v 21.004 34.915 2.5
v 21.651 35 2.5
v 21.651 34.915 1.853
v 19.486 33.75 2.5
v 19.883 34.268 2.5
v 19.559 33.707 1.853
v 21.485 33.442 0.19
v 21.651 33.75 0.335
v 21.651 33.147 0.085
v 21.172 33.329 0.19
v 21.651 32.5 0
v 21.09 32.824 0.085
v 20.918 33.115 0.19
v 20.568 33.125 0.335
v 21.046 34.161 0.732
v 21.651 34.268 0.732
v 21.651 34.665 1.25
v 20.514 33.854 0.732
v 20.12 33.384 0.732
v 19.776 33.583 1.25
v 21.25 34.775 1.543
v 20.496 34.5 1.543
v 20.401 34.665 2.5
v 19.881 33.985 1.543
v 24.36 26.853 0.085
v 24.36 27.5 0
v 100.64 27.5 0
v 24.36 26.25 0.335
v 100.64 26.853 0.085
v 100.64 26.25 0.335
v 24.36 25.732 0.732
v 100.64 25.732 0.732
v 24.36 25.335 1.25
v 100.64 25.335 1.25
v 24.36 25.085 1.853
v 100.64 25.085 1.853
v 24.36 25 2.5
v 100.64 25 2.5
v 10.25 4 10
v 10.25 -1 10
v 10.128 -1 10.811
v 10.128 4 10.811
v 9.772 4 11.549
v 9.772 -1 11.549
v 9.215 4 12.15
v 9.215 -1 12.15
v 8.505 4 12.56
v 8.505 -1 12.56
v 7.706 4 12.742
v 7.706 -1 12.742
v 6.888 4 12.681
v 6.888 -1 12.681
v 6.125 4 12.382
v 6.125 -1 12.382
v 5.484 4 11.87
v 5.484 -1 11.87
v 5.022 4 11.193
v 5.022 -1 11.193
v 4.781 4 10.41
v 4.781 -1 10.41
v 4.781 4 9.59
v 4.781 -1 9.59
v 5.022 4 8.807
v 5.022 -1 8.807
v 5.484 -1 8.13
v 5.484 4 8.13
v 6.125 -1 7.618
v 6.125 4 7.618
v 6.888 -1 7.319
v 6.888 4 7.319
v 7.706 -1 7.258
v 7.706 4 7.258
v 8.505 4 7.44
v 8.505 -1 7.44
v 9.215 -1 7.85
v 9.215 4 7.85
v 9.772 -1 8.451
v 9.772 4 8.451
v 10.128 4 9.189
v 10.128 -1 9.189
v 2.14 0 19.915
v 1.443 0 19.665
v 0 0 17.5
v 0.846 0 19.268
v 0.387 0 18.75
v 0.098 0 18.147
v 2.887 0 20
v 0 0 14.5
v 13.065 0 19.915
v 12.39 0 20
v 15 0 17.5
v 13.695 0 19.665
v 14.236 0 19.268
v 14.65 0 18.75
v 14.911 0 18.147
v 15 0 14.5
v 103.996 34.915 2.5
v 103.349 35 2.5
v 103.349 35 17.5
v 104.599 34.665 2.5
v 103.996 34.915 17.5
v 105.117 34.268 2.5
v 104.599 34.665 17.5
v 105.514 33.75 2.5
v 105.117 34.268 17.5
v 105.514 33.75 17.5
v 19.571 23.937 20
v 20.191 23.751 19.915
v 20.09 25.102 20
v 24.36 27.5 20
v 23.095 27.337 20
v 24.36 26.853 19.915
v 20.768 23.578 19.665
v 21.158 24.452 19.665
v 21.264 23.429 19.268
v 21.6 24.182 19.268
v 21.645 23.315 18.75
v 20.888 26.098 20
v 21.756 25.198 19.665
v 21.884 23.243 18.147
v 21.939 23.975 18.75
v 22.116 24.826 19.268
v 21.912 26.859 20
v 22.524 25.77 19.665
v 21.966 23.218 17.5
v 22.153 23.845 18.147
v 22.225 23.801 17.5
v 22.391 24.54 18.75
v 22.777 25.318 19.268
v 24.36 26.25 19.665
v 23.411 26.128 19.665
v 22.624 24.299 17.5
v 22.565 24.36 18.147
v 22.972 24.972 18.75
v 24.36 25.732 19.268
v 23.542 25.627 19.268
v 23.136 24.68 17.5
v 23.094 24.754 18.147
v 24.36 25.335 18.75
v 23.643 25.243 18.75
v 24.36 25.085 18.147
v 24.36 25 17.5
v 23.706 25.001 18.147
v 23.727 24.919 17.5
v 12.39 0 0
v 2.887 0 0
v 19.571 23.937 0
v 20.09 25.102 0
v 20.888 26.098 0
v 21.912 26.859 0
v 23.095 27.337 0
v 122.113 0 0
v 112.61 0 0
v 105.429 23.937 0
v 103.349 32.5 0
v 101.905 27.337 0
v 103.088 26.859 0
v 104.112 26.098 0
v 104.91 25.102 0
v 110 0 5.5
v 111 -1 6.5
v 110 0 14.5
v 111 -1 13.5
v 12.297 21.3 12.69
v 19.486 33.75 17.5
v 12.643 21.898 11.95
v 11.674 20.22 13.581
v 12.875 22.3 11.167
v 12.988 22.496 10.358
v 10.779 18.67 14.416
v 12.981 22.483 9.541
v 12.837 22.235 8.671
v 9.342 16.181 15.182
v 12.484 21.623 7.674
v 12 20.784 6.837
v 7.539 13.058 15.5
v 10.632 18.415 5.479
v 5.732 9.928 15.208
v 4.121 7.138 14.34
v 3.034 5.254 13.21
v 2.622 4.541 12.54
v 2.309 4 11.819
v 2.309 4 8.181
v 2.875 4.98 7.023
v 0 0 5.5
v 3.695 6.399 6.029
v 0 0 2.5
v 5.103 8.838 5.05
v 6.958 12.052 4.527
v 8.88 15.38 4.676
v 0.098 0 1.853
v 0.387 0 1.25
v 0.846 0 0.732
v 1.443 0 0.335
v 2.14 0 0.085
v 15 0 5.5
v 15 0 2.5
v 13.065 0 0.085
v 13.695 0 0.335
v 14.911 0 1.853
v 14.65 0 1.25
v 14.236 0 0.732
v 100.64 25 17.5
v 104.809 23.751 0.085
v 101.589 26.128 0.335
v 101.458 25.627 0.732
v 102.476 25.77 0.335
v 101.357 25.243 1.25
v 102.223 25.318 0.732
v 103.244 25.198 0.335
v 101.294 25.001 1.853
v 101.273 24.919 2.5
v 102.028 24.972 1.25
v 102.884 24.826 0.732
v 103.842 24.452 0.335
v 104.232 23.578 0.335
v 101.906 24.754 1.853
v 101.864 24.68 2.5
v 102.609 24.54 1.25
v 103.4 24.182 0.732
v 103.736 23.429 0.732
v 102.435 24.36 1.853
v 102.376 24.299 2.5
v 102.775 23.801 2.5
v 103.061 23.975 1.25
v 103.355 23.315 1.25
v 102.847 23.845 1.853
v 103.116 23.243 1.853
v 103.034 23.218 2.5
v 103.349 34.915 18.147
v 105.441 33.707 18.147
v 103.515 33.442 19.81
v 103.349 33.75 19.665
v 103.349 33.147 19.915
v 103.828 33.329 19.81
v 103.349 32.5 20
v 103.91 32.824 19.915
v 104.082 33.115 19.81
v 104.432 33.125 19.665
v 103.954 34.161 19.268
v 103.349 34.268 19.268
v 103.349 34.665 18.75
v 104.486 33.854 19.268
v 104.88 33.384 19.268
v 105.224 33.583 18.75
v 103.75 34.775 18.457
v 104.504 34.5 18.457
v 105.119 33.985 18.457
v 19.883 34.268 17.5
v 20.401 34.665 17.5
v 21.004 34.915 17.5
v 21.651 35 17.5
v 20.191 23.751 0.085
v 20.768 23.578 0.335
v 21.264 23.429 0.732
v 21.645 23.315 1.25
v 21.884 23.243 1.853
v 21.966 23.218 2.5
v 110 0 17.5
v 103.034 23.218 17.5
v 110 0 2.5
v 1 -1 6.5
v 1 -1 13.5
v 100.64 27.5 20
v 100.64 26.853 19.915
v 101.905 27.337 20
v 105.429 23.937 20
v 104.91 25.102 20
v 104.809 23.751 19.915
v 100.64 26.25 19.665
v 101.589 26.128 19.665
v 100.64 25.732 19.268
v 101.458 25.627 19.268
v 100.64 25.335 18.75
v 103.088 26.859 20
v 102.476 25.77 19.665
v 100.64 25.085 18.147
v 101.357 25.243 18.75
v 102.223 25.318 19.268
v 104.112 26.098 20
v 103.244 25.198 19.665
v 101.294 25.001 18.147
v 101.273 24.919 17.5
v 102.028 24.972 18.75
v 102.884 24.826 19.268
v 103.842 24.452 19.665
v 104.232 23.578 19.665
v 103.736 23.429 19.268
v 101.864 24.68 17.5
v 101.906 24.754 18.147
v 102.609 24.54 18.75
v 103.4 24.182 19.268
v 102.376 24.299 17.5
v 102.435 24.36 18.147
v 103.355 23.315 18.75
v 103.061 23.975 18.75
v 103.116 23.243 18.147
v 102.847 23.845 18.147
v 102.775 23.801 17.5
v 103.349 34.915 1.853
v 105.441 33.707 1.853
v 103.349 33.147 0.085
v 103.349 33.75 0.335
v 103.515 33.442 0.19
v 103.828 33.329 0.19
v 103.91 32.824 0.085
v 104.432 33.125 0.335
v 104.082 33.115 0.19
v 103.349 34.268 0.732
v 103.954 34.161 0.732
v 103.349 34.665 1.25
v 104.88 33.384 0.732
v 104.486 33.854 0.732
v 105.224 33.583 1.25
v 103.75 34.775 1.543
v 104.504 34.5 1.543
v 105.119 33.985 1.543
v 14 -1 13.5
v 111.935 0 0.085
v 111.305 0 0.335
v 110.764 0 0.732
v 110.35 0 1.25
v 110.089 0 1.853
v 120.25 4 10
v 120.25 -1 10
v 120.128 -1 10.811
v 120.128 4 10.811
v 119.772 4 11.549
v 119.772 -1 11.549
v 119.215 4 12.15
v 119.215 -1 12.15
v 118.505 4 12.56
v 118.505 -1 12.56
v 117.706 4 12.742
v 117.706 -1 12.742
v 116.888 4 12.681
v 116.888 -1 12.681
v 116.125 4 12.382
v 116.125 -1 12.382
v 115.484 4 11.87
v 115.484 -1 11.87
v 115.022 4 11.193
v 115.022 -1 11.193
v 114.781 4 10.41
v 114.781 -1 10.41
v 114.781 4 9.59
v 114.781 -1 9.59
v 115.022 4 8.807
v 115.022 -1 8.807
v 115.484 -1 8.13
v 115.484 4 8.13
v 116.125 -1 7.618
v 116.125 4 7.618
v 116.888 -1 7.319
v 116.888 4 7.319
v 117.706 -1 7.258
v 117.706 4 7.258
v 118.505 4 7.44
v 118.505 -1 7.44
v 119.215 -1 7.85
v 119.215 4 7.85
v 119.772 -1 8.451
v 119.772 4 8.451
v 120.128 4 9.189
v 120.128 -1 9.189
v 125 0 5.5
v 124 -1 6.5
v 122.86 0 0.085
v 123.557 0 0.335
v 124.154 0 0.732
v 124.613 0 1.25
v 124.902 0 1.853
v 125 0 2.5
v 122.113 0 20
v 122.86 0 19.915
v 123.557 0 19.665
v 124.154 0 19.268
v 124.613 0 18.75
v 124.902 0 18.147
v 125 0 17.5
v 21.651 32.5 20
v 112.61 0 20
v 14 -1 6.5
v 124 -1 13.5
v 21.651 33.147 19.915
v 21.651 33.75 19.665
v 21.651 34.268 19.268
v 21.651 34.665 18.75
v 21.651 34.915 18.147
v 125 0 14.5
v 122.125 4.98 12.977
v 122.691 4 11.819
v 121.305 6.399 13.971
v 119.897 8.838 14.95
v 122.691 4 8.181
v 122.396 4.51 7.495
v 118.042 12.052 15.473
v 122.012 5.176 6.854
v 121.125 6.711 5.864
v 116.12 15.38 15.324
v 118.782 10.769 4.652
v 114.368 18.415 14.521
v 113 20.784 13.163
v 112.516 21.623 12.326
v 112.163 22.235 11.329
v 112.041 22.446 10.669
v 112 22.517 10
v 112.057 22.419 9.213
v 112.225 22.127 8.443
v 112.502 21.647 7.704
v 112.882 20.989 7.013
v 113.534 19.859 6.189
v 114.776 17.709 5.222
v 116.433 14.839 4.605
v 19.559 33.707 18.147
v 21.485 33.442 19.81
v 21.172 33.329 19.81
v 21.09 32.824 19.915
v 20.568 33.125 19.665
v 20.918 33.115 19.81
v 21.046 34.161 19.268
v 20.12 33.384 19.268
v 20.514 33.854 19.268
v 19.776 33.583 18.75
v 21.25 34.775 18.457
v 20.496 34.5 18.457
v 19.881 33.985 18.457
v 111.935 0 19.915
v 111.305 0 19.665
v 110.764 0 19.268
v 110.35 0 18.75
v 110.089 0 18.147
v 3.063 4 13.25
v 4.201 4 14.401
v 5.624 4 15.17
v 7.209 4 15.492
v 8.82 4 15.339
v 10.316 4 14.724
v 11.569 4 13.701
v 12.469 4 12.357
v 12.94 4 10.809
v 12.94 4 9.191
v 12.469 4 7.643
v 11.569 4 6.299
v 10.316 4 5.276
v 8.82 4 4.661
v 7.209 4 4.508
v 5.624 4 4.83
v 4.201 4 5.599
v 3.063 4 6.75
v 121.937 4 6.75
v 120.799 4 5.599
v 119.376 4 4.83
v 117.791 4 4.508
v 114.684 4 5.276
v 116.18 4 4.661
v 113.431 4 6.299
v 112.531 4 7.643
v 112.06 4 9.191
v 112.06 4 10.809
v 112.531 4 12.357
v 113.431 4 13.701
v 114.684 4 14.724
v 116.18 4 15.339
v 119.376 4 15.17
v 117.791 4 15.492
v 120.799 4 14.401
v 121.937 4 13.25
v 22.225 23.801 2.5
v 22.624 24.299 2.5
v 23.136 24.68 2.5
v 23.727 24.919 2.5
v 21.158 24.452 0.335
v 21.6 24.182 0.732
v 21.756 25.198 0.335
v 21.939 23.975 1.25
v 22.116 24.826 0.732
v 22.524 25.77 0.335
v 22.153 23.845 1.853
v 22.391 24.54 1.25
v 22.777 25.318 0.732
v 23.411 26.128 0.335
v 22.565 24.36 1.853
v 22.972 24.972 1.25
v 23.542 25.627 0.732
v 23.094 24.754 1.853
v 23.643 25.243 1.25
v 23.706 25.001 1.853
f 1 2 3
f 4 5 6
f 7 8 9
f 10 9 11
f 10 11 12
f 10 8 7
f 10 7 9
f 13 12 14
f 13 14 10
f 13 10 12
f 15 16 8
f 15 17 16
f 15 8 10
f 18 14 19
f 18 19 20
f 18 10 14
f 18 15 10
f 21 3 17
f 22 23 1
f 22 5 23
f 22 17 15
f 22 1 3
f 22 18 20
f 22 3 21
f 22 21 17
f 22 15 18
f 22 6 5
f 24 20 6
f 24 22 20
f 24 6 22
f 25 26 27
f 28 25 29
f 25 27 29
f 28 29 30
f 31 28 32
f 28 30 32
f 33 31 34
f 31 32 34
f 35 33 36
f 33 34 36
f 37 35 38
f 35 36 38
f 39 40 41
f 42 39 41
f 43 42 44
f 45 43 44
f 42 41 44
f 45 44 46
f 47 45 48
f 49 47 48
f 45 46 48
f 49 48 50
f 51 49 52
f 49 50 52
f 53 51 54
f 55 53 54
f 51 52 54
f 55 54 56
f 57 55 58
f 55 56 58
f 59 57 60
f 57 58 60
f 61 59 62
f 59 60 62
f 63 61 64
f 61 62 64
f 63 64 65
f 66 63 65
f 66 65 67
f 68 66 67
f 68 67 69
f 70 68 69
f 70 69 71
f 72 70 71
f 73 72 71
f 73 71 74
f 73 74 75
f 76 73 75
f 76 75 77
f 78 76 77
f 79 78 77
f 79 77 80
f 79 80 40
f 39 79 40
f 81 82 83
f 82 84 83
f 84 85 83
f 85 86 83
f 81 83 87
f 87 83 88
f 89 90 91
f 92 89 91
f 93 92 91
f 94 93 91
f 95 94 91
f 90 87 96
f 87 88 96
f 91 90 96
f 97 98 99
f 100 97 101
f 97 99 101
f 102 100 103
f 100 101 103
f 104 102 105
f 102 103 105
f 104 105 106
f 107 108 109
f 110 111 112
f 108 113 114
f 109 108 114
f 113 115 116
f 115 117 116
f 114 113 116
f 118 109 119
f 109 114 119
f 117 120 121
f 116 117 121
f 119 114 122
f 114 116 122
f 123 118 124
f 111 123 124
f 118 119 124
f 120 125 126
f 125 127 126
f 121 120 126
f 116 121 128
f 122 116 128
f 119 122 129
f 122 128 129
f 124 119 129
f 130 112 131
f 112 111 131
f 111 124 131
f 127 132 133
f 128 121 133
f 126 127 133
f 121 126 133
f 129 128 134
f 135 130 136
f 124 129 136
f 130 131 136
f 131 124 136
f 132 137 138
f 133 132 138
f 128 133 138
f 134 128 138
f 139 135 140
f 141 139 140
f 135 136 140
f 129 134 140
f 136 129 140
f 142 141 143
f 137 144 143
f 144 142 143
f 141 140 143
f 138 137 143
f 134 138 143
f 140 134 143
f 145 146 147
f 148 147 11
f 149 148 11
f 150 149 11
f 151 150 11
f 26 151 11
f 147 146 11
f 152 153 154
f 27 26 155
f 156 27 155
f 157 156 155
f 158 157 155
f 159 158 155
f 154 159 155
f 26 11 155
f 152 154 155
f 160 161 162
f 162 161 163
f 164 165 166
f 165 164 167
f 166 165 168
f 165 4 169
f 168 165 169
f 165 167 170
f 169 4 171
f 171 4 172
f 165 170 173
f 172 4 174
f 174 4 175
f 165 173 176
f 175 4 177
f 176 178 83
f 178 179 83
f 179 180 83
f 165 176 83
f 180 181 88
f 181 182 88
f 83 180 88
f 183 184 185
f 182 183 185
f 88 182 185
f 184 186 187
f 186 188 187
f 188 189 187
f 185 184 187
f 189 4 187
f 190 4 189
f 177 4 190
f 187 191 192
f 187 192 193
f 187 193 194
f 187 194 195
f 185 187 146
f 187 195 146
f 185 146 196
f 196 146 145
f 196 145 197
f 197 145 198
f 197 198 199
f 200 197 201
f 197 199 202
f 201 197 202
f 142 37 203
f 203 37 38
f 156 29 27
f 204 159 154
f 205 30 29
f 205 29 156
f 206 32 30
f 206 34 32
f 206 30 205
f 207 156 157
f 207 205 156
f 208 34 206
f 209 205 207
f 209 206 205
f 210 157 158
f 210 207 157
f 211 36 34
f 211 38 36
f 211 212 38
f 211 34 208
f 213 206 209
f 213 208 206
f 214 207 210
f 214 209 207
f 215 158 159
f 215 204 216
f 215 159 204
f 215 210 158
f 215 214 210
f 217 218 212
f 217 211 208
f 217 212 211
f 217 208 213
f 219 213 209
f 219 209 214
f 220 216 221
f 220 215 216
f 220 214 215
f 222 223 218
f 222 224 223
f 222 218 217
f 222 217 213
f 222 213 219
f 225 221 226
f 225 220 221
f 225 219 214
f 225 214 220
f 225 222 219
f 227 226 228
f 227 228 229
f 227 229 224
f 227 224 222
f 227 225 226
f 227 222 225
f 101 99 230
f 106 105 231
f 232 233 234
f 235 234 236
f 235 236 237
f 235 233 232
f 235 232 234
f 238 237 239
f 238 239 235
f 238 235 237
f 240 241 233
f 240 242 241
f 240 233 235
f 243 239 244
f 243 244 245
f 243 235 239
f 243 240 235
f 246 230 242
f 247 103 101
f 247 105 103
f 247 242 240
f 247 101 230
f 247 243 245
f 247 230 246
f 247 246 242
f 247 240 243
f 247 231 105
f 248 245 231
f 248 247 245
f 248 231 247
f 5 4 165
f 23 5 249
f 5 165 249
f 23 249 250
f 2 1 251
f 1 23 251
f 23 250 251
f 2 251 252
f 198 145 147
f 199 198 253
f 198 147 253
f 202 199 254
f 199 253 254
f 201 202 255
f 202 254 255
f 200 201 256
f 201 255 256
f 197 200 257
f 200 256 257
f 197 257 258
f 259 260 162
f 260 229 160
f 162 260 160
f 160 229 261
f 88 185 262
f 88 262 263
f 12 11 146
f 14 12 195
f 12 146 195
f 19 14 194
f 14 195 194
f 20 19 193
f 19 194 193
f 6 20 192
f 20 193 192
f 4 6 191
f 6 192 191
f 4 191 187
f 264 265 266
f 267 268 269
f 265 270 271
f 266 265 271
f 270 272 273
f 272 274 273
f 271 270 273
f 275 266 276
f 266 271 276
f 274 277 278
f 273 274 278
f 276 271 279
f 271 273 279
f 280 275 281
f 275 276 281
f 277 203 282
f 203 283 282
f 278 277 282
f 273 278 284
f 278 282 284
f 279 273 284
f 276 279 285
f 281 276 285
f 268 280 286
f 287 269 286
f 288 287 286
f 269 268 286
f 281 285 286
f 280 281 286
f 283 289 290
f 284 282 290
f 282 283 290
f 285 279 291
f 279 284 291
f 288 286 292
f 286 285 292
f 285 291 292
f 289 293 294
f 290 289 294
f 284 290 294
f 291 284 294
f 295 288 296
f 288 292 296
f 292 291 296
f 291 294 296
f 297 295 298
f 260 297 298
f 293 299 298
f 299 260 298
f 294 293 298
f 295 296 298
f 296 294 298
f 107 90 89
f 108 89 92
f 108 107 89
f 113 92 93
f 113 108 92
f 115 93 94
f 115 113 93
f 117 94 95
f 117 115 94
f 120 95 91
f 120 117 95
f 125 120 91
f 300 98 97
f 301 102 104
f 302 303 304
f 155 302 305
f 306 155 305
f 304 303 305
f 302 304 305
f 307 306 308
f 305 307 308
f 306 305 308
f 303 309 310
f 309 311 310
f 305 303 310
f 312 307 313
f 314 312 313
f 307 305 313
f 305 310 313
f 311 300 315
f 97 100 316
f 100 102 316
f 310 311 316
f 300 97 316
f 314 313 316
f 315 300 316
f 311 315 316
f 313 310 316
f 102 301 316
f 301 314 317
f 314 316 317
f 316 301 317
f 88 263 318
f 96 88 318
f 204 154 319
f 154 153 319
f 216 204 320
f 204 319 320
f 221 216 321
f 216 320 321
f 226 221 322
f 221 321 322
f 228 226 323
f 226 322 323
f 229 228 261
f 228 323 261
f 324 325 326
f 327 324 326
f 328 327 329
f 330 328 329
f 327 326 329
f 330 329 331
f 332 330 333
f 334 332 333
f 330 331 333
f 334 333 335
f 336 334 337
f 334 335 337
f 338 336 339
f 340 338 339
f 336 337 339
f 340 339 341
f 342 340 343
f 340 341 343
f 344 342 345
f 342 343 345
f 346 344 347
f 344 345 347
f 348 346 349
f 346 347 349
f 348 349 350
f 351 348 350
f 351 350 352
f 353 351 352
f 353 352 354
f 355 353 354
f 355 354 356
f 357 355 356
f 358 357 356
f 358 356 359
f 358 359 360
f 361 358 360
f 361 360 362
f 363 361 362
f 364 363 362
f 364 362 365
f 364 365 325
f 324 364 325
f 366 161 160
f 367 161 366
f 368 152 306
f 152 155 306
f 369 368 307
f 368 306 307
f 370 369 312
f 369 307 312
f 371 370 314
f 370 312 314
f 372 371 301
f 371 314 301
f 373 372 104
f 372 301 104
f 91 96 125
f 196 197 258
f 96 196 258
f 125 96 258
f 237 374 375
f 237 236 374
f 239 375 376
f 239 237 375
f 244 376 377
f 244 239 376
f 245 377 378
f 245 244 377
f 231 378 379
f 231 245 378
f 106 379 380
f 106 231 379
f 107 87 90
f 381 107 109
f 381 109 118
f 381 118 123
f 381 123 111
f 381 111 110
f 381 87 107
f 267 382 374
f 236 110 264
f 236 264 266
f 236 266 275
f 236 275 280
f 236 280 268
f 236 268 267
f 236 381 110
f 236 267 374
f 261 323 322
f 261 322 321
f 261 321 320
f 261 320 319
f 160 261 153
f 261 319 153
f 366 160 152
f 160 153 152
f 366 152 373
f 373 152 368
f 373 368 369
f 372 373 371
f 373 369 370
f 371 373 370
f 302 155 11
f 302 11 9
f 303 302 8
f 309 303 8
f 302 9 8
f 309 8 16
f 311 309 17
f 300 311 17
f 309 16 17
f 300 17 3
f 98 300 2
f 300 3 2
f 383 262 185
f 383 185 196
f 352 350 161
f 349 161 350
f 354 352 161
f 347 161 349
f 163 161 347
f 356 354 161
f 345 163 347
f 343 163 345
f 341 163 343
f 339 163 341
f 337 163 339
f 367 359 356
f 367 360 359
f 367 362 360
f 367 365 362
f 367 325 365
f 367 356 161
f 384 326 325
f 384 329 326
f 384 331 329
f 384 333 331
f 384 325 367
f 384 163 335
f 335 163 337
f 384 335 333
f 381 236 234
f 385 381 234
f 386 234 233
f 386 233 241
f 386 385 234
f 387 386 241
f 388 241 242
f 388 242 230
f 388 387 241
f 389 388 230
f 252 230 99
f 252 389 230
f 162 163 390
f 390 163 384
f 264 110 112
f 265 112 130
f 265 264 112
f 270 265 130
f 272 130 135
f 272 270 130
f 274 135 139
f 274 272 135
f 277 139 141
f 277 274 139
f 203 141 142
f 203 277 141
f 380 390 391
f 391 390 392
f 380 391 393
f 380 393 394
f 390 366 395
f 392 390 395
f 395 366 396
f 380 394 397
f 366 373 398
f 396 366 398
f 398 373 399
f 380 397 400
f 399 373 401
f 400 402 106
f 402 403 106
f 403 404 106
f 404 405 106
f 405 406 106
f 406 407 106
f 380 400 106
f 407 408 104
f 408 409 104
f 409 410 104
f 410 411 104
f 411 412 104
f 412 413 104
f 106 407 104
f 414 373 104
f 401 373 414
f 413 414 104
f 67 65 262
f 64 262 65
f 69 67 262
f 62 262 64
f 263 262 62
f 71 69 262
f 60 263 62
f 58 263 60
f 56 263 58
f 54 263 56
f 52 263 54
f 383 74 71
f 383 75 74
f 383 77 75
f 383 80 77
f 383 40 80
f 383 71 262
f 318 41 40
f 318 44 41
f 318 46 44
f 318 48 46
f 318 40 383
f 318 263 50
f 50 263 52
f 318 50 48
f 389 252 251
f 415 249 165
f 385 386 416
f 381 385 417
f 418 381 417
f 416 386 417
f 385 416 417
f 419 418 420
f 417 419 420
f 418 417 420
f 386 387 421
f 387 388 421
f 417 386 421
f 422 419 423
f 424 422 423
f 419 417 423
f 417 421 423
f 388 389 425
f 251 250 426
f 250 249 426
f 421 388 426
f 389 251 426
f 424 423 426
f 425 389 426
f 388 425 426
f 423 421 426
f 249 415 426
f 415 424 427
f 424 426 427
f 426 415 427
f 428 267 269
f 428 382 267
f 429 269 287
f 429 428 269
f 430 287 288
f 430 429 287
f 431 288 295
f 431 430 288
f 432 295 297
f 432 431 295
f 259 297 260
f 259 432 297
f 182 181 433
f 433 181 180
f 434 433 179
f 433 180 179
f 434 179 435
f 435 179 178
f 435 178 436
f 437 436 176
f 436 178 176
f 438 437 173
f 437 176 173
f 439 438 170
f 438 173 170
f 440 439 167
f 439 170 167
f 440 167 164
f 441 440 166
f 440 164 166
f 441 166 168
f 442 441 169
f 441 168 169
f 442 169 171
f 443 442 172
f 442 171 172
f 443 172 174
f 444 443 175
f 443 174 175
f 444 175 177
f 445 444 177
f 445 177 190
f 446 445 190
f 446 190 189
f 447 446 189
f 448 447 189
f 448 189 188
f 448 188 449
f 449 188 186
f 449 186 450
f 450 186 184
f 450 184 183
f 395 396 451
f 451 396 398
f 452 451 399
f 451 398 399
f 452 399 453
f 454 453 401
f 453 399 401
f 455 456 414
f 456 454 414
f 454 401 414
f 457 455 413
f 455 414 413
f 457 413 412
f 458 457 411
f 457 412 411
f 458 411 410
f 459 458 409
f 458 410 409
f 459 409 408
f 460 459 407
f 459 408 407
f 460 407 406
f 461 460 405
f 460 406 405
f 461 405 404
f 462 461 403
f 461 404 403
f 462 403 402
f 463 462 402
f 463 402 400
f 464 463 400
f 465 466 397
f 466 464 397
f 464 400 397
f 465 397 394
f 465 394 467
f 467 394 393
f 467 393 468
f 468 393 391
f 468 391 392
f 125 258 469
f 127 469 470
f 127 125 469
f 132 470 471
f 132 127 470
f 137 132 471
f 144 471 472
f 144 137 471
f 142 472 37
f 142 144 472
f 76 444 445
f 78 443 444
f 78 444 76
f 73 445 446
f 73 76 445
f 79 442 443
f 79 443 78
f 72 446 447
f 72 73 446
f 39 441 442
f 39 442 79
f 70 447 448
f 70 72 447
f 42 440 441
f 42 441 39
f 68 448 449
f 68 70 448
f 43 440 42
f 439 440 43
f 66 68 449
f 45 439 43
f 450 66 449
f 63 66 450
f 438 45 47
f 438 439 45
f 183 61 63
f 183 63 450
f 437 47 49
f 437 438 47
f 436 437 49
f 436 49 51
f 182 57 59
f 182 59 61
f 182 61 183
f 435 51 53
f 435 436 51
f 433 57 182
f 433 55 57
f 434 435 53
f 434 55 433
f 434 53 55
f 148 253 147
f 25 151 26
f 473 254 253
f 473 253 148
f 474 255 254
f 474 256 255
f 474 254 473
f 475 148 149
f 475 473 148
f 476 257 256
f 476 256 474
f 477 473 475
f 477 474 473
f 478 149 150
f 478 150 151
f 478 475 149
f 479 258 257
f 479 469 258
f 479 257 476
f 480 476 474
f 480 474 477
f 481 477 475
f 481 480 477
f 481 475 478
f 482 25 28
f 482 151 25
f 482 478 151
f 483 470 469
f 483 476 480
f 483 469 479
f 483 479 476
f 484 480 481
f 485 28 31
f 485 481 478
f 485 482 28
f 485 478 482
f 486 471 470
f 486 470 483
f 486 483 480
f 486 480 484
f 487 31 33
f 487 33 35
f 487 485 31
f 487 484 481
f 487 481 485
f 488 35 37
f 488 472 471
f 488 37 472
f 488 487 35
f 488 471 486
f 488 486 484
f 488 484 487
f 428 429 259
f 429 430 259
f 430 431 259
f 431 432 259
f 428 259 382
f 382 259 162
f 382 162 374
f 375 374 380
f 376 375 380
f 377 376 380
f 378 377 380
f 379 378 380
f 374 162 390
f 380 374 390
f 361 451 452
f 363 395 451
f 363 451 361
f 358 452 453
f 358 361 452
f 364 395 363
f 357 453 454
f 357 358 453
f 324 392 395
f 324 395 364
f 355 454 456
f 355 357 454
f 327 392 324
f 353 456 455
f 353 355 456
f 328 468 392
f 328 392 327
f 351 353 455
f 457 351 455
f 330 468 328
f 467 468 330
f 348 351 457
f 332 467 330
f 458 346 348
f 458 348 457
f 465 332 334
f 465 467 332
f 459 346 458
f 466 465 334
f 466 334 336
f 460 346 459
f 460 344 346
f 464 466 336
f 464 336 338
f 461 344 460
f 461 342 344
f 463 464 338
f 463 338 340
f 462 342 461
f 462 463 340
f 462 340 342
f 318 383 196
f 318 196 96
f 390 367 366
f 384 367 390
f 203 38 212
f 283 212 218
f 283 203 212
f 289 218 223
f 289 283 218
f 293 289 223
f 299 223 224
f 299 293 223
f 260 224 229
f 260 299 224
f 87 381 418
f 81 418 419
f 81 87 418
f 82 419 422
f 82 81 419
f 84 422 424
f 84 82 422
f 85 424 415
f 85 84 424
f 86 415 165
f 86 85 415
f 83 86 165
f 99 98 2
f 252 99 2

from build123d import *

# Parameters (mm, degrees)
F1_DEPTH = 20
F2_W     = 15
F2_H     = 9
F3_DEPTH = 1
F4_R     = 2.75
F5_DEPTH = 36.001
F6_R     = 5.5
F7_DEPTH = 31
F8_F1_R  = 2.5
F8_F2_R  = 2.5
F9_SIZE  = 0.99999


# Not quite as in the source:
# - a fillet or chamfer is up to 0.001 mm smaller than in the source, because OpenCascade refuses the exact size


with BuildPart() as f1:
    # F0 (on Top) → F1 (new body)
    with BuildSketch(Plane.XY):
        Polygon((20.2072594216, 35), (0, 0), (15, 0), (22.5, 25), (102.5, 25), (110, 0), (125, 0), (104.7927405784, 35), align=None)
    extrude(amount=F1_DEPTH)

    # F2 (on face) → F3 (join)
    with BuildSketch(Plane.XZ):
        with Locations((7.5, 10)):
            Rectangle(F2_W, F2_H)
        with Locations((117.5, 10)):
            Rectangle(F2_W, F2_H)
    extrude(amount=F3_DEPTH)

    # F4 (on face) → F5 (cut, through all)
    with BuildSketch(Plane.XZ.offset(1)):
        with Locations((7.5, 10)):
            Circle(F4_R)
        with Locations((117.5, 10)):
            Circle(F4_R)
    extrude(amount=-F5_DEPTH, mode=Mode.SUBTRACT)

    # F6 (on face) → F7 (cut)
    with BuildSketch(Plane(origin=(0, 35, 0), x_dir=(-1, 0, 0), z_dir=(0, 1, 0))):
        with Locations((-117.5, 10)):
            Circle(F6_R)
        with Locations((-7.5, 10)):
            Circle(F6_R)
    extrude(amount=-F7_DEPTH, mode=Mode.SUBTRACT)

    # F8: fillet of radius 2.5 on 12 edges, made by hand

    # F8_f1
    f8_f1_edges = [f1.edges().sort_by_distance(p)[0] for p in [
        (22.5, 25, 10),
        (102.5, 25, 10),
    ]]
    fillet(f8_f1_edges, radius=F8_F1_R)

    # F8_f2
    f8_f2_edges = [f1.edges().sort_by_distance(p)[0] for p in [
        (62.5, 25, 0),
        (62.5, 25, 20),
        (104.7927405784, 35, 10),
        (20.2072594216, 35, 10),
        (62.5, 35, 0),
        (62.5, 35, 20),
        (114.8963702892, 17.5, 20),
        (114.8963702892, 17.5, 0),
        (10.1036297108, 17.5, 20),
        (10.1036297108, 17.5, 0),
        (22.8677503031, 24.5057323207, 20),
        (102.1322496969, 24.5057323207, 20),
        (22.8677503031, 24.5057323207, 0),
        (102.1322496969, 24.5057323207, 0),
    ]]
    fillet(f8_f2_edges, radius=F8_F2_R)

    # F9 (size 1 in the source; OpenCascade refuses exactly that, so slightly less here)
    f9_edges = [f1.edges().sort_by_distance(p)[0] for p in [
        (7.5, -1, 14.5),
        (0, -1, 10),
        (7.5, -1, 5.5),
        (15, -1, 10),
        (117.5, -1, 14.5),
        (110, -1, 10),
        (117.5, -1, 5.5),
        (125, -1, 10),
    ]]
    chamfer(f9_edges, length=F9_SIZE)


solid = f1.part
